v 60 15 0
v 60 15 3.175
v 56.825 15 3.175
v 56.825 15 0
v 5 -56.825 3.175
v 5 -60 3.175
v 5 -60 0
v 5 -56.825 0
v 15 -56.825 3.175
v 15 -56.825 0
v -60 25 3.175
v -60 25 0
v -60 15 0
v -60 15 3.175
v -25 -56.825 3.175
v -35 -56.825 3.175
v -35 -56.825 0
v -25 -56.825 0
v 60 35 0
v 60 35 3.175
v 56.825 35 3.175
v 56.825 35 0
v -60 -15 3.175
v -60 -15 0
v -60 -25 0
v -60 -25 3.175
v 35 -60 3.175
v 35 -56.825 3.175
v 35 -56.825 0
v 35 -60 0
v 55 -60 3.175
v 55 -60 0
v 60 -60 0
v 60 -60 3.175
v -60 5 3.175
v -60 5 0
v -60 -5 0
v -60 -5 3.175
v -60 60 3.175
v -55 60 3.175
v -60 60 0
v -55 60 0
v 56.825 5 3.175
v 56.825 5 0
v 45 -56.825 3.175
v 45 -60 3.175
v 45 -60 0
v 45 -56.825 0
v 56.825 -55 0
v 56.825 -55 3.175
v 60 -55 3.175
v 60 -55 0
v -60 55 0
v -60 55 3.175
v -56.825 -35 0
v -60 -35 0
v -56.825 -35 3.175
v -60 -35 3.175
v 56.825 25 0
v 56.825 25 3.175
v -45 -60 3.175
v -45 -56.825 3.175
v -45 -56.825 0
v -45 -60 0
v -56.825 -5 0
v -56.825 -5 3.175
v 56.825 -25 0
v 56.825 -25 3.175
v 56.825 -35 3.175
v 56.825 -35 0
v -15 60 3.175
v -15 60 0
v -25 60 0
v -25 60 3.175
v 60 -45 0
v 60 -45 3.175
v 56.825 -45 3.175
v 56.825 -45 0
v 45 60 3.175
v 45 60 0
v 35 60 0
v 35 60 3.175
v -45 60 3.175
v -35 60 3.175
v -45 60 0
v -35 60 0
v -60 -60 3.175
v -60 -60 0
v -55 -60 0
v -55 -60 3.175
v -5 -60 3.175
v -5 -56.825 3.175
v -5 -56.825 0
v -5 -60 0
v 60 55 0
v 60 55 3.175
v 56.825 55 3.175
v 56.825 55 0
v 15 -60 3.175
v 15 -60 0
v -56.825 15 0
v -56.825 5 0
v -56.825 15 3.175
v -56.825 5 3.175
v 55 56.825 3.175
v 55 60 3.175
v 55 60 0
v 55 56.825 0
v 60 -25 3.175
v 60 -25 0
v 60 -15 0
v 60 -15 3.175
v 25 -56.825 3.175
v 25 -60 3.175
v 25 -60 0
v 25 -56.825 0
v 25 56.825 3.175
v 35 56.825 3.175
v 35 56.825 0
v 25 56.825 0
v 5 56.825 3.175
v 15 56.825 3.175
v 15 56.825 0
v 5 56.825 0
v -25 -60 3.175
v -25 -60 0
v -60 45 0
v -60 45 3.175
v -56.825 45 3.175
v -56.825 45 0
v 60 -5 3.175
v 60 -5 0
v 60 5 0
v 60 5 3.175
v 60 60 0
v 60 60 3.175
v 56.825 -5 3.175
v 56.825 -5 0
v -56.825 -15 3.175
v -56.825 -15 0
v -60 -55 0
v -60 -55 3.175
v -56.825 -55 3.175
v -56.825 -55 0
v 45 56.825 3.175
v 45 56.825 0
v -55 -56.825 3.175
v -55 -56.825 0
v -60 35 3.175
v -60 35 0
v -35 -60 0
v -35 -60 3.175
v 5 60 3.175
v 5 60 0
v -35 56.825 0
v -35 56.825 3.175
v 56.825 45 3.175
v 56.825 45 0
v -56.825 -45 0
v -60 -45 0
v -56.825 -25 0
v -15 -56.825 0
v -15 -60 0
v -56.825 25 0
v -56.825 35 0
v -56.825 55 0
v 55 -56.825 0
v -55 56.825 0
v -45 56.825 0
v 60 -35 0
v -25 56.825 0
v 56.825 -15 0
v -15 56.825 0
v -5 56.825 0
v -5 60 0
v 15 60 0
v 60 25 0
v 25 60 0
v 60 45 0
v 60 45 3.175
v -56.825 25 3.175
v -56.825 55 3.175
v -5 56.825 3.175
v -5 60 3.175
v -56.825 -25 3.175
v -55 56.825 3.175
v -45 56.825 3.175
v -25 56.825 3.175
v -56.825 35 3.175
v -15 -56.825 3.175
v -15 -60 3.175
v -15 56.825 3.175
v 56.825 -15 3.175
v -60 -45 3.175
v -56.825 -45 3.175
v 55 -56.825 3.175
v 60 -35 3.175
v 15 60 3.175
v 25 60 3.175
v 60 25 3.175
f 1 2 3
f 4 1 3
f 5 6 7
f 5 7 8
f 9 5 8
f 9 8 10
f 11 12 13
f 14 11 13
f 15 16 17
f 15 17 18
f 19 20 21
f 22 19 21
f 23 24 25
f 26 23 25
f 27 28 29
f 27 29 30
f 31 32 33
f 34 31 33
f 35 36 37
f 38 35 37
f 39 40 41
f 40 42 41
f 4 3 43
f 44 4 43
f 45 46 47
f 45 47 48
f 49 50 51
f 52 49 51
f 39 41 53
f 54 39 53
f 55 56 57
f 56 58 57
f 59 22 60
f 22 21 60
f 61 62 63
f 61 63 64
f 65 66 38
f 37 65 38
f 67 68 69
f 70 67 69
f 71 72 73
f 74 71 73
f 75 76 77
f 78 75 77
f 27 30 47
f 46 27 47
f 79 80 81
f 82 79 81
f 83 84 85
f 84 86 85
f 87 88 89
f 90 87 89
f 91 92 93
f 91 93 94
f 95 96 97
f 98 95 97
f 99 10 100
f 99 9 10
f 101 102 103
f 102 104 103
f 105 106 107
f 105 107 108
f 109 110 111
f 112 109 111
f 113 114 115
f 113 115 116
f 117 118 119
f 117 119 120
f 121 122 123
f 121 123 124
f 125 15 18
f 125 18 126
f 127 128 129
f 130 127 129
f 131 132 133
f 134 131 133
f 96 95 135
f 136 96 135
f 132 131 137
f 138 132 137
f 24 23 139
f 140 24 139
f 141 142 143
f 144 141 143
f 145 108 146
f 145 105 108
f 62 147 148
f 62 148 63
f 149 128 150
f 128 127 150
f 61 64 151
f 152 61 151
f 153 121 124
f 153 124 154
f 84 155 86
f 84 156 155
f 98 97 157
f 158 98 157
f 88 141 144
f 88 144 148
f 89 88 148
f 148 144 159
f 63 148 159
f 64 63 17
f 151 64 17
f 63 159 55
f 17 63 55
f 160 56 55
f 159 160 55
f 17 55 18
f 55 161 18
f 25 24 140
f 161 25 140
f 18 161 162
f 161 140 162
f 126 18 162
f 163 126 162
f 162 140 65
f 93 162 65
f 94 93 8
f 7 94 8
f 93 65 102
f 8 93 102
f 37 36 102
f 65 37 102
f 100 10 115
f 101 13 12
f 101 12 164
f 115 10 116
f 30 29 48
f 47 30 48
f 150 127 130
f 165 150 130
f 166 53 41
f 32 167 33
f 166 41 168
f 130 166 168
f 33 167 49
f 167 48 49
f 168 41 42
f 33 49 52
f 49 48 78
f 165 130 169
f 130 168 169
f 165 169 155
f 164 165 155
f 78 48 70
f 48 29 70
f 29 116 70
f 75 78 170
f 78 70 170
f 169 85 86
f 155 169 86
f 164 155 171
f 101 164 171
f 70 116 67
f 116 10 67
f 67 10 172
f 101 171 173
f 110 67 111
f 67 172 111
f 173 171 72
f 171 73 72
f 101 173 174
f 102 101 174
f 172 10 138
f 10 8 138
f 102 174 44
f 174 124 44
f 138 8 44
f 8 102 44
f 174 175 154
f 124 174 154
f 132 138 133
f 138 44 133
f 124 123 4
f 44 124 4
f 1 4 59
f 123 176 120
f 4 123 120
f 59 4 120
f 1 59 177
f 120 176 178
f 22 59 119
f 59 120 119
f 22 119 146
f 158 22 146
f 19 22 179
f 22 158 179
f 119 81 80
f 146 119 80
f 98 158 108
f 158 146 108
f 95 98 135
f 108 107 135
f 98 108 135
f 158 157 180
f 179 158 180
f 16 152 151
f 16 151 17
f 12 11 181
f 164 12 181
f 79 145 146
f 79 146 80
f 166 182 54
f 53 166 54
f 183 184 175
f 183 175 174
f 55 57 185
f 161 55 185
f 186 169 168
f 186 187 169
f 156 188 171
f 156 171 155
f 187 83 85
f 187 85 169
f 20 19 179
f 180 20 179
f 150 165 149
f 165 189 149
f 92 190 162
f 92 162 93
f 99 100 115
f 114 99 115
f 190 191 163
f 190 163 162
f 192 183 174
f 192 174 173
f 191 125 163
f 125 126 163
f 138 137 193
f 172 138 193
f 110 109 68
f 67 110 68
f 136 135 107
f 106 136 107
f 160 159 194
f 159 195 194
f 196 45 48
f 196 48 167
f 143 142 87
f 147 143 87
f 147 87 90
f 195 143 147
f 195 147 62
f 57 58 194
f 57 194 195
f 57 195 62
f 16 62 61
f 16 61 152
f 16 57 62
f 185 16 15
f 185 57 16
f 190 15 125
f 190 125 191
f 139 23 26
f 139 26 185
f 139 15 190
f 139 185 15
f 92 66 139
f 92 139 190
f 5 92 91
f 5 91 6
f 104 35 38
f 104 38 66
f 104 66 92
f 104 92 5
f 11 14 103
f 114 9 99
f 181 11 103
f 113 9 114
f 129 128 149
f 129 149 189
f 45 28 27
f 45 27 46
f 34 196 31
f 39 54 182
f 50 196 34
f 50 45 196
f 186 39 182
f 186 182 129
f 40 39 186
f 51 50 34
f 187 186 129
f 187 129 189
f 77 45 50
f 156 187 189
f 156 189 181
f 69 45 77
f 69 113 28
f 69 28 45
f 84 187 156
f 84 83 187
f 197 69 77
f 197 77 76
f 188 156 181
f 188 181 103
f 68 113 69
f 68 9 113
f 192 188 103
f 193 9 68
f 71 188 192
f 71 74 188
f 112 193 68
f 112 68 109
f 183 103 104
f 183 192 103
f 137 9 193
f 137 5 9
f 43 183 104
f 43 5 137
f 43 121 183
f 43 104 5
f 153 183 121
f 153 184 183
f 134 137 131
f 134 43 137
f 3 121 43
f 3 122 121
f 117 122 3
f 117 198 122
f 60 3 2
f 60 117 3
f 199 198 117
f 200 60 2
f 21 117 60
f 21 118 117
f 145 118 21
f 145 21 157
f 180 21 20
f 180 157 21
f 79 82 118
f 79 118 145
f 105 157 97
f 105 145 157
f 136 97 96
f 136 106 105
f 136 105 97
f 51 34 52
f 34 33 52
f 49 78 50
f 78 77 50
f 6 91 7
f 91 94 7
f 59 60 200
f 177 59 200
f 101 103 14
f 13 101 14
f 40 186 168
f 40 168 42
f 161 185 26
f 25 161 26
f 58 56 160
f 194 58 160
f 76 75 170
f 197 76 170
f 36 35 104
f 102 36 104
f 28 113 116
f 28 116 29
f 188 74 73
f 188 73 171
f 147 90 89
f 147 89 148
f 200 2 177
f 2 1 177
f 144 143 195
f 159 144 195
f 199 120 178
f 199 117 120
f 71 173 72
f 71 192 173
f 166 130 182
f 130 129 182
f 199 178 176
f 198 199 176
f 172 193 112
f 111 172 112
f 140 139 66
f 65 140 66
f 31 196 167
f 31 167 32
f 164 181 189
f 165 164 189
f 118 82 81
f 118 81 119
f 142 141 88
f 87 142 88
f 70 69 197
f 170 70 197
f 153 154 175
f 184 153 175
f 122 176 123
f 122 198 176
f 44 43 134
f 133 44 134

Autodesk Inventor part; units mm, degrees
ref_plane "YZ Plane" through (0, 0, 0) normal (1, 0, 0) x (0, 1, 0)
ref_plane "XZ Plane" through (0, 0, 0) normal (0, 1, 0) x (-1, 0, 0)
ref_plane "XY Plane" through (0, 0, 0) normal (0, 0, 1) x (1, 0, 0)
sketch "Sketch1" plane through (0, 0, 0) normal (0, 0, 1) x (1, 0, 0)
  line L0 (-60, -60) -> (60, -60)
  line L1 (60, -60) -> (60, 60)
  line L2 (60, 60) -> (-60, 60)
  line L3 (-60, 60) -> (-60, -60)
  line L4 (-60, -60) -> (60, 60) construction
  line L5 (60, -60) -> (-60, 60) construction
  point P0 (0, 0)
  dimension "d0" = 120
  dimension "d1" = 120
extrude "Extrusion1" add sketch "Sketch1" along normal blind 3.175
sketch "Sketch5" plane through (0, 0, 3.175) normal (0, 0, 1) x (1, 0, 0)
  line L0 (-60, -60) -> (60, -60) projected
  line L1 (60, -60) -> (60, 60) projected
  line L2 (60, 60) -> (-60, 60) projected
  line L3 (-60, 60) -> (-60, -60) projected
  line L4 (-60, -60) -> (60, -60) projected
  line L5 (55, -60) -> (45, -60)
  line L6 (45, -60) -> (45, -56.825)
  line L7 (45, -56.825) -> (55, -56.825)
  line L8 (55, -56.825) -> (55, -60)
  point P0 (0, 0)
  dimension "d25" = 10
  dimension "d27" = 5
  dimension "d41" = 3.175
extrude "Extrusion3" cut sketch "Sketch5" against normal up to surface (3.175 mm away) contours L6 L7 L8 L0
pattern_linear "Rectangular Pattern2" count 6 spacing 20 along (-1, 0, 0) of "Extrusion3"
mirror "Mirror2" about plane through (0, 0, 0) normal (0, 1, 0) of "Extrusion3", "Rectangular Pattern2"
sketch "Sketch6" plane through (0, 0, 3.175) normal (0, 0, 1) x (1, 0, 0)
  line L0 (-60, -60) -> (-55, -60) projected
  line L1 (-45, -60) -> (-35, -60) projected
  line L2 (-25, -60) -> (-15, -60) projected
  line L3 (-5, -60) -> (5, -60) projected
  line L4 (15, -60) -> (25, -60) projected
  line L5 (35, -60) -> (45, -60) projected
  line L6 (60, -60) -> (60, 60) projected
  line L7 (60, 60) -> (55, 60) projected
  line L8 (45, 60) -> (35, 60) projected
  line L9 (25, 60) -> (15, 60) projected
  line L10 (5, 60) -> (-5, 60) projected
  line L11 (-15, 60) -> (-25, 60) projected
  line L12 (-35, 60) -> (-45, 60) projected
  line L13 (-60, 60) -> (-60, -60) projected
  line L14 (-60, -55) -> (-56.825, -55)
  line L15 (-56.825, -55) -> (-56.825, -45)
  line L16 (-56.825, -45) -> (-60, -45)
  line L17 (-60, -45) -> (-60, -55)
  line L18 (55, -60) -> (60, -60) projected
  line L19 (-55, 60) -> (-60, 60) projected
  line L20 (-55, 56.825) -> (-55, 60) projected
  line L21 (-55, -60) -> (-55, -56.825) projected
  line L22 (-55, -56.825) -> (-45, -56.825) projected
  line L23 (-45, -56.825) -> (-45, -60) projected
  line L24 (-35, -60) -> (-35, -56.825) projected
  line L25 (-35, -56.825) -> (-25, -56.825) projected
  line L26 (-25, -56.825) -> (-25, -60) projected
  line L27 (-15, -60) -> (-15, -56.825) projected
  line L28 (-15, -56.825) -> (-5, -56.825) projected
  line L29 (-5, -56.825) -> (-5, -60) projected
  line L30 (5, -60) -> (5, -56.825) projected
  line L31 (5, -56.825) -> (15, -56.825) projected
  line L32 (15, -56.825) -> (15, -60) projected
  line L33 (25, -60) -> (25, -56.825) projected
  line L34 (25, -56.825) -> (35, -56.825) projected
  line L35 (35, -56.825) -> (35, -60) projected
  line L36 (45, -60) -> (45, -56.825) projected
  line L37 (45, -56.825) -> (55, -56.825) projected
  line L38 (55, -56.825) -> (55, -60) projected
  line L39 (55, 60) -> (55, 56.825) projected
  line L40 (55, 56.825) -> (45, 56.825) projected
  line L41 (45, 56.825) -> (45, 60) projected
  line L42 (35, 60) -> (35, 56.825) projected
  line L43 (35, 56.825) -> (25, 56.825) projected
  line L44 (25, 56.825) -> (25, 60) projected
  line L45 (15, 60) -> (15, 56.825) projected
  line L46 (15, 56.825) -> (5, 56.825) projected
  line L47 (5, 56.825) -> (5, 60) projected
  line L48 (-5, 60) -> (-5, 56.825) projected
  line L49 (-5, 56.825) -> (-15, 56.825) projected
  line L50 (-15, 56.825) -> (-15, 60) projected
  line L51 (-25, 60) -> (-25, 56.825) projected
  line L52 (-25, 56.825) -> (-35, 56.825) projected
  line L53 (-35, 56.825) -> (-35, 60) projected
  line L54 (-45, 60) -> (-45, 56.825) projected
  line L55 (-45, 56.825) -> (-55, 56.825) projected
  point P0 (0, 0)
  dimension "d34" = 10
  dimension "d35" = 5
  dimension "d42" = 3.175
extrude "Extrusion4" cut sketch "Sketch6" against normal up to surface (3.175 mm away) contours L13 L16 L15 L14
pattern_linear "Rectangular Pattern3" count 6 spacing 20 along (0, 1, 0) of "Extrusion4"
mirror "Mirror3" about plane through (0, 0, 0) normal (1, 0, 0) of "Extrusion4", "Rectangular Pattern3"
equation "\"d0\" = width"
equation "\"d1\" = depth"
equation "\"d2\" = materialThickness"
equation "\"d25\" = notchWidth"
equation "\"d27\" = 0 * materialThickness + 0.5 * width - 5.5 * notchWidth"
equation "\"d41\" = materialThickness"
equation "\"d32\" = 2 * notchWidth"
equation "\"d34\" = notchWidth"
equation "\"d35\" = 0 * materialThickness + 0.5 * depth - 5.5 * notchWidth"
equation "\"d42\" = materialThickness"
equation "\"d40\" = 2 * notchWidth"
equation "\"width\" = 120"
equation "\"depth\" = 120"
equation "\"materialThickness\" = 3.175"
equation "\"laserKerf\" = 0.12"
equation "\"cardPinDiameter\" = 3"
equation "\"cardFillet\" = 2.88"
equation "\"cardSelected\" = 1"
equation "\"cardThickness\" = 0.76"
equation "\"cardHeight\" = 53.98"
equation "\"cardWidth\" = 85.6"
equation "\"centeralShaftDiameter\" = 8"
equation "\"cardClearence\" = 0.5"
equation "\"bearingOd\" = 22"
equation "\"bearingWidth\" = 8"
equation "\"axleHeight\" = 95"
equation "\"nutTrapDepth\" = 2.5"
equation "\"nutTrapwidth\" = 5.5"
equation "\"nutTrapClearence\" = 2"
equation "\"magnetLength\" = 3"
equation "\"magnetDiameter\" = 6"
equation "\"magnetProtusion\" = 0.25"
equation "\"notchWidth\" = 10"
equation "\"spoolThickness\" = 5.588"
properties part number "topBottomPanel" material "Polycarbonate, Clear"
